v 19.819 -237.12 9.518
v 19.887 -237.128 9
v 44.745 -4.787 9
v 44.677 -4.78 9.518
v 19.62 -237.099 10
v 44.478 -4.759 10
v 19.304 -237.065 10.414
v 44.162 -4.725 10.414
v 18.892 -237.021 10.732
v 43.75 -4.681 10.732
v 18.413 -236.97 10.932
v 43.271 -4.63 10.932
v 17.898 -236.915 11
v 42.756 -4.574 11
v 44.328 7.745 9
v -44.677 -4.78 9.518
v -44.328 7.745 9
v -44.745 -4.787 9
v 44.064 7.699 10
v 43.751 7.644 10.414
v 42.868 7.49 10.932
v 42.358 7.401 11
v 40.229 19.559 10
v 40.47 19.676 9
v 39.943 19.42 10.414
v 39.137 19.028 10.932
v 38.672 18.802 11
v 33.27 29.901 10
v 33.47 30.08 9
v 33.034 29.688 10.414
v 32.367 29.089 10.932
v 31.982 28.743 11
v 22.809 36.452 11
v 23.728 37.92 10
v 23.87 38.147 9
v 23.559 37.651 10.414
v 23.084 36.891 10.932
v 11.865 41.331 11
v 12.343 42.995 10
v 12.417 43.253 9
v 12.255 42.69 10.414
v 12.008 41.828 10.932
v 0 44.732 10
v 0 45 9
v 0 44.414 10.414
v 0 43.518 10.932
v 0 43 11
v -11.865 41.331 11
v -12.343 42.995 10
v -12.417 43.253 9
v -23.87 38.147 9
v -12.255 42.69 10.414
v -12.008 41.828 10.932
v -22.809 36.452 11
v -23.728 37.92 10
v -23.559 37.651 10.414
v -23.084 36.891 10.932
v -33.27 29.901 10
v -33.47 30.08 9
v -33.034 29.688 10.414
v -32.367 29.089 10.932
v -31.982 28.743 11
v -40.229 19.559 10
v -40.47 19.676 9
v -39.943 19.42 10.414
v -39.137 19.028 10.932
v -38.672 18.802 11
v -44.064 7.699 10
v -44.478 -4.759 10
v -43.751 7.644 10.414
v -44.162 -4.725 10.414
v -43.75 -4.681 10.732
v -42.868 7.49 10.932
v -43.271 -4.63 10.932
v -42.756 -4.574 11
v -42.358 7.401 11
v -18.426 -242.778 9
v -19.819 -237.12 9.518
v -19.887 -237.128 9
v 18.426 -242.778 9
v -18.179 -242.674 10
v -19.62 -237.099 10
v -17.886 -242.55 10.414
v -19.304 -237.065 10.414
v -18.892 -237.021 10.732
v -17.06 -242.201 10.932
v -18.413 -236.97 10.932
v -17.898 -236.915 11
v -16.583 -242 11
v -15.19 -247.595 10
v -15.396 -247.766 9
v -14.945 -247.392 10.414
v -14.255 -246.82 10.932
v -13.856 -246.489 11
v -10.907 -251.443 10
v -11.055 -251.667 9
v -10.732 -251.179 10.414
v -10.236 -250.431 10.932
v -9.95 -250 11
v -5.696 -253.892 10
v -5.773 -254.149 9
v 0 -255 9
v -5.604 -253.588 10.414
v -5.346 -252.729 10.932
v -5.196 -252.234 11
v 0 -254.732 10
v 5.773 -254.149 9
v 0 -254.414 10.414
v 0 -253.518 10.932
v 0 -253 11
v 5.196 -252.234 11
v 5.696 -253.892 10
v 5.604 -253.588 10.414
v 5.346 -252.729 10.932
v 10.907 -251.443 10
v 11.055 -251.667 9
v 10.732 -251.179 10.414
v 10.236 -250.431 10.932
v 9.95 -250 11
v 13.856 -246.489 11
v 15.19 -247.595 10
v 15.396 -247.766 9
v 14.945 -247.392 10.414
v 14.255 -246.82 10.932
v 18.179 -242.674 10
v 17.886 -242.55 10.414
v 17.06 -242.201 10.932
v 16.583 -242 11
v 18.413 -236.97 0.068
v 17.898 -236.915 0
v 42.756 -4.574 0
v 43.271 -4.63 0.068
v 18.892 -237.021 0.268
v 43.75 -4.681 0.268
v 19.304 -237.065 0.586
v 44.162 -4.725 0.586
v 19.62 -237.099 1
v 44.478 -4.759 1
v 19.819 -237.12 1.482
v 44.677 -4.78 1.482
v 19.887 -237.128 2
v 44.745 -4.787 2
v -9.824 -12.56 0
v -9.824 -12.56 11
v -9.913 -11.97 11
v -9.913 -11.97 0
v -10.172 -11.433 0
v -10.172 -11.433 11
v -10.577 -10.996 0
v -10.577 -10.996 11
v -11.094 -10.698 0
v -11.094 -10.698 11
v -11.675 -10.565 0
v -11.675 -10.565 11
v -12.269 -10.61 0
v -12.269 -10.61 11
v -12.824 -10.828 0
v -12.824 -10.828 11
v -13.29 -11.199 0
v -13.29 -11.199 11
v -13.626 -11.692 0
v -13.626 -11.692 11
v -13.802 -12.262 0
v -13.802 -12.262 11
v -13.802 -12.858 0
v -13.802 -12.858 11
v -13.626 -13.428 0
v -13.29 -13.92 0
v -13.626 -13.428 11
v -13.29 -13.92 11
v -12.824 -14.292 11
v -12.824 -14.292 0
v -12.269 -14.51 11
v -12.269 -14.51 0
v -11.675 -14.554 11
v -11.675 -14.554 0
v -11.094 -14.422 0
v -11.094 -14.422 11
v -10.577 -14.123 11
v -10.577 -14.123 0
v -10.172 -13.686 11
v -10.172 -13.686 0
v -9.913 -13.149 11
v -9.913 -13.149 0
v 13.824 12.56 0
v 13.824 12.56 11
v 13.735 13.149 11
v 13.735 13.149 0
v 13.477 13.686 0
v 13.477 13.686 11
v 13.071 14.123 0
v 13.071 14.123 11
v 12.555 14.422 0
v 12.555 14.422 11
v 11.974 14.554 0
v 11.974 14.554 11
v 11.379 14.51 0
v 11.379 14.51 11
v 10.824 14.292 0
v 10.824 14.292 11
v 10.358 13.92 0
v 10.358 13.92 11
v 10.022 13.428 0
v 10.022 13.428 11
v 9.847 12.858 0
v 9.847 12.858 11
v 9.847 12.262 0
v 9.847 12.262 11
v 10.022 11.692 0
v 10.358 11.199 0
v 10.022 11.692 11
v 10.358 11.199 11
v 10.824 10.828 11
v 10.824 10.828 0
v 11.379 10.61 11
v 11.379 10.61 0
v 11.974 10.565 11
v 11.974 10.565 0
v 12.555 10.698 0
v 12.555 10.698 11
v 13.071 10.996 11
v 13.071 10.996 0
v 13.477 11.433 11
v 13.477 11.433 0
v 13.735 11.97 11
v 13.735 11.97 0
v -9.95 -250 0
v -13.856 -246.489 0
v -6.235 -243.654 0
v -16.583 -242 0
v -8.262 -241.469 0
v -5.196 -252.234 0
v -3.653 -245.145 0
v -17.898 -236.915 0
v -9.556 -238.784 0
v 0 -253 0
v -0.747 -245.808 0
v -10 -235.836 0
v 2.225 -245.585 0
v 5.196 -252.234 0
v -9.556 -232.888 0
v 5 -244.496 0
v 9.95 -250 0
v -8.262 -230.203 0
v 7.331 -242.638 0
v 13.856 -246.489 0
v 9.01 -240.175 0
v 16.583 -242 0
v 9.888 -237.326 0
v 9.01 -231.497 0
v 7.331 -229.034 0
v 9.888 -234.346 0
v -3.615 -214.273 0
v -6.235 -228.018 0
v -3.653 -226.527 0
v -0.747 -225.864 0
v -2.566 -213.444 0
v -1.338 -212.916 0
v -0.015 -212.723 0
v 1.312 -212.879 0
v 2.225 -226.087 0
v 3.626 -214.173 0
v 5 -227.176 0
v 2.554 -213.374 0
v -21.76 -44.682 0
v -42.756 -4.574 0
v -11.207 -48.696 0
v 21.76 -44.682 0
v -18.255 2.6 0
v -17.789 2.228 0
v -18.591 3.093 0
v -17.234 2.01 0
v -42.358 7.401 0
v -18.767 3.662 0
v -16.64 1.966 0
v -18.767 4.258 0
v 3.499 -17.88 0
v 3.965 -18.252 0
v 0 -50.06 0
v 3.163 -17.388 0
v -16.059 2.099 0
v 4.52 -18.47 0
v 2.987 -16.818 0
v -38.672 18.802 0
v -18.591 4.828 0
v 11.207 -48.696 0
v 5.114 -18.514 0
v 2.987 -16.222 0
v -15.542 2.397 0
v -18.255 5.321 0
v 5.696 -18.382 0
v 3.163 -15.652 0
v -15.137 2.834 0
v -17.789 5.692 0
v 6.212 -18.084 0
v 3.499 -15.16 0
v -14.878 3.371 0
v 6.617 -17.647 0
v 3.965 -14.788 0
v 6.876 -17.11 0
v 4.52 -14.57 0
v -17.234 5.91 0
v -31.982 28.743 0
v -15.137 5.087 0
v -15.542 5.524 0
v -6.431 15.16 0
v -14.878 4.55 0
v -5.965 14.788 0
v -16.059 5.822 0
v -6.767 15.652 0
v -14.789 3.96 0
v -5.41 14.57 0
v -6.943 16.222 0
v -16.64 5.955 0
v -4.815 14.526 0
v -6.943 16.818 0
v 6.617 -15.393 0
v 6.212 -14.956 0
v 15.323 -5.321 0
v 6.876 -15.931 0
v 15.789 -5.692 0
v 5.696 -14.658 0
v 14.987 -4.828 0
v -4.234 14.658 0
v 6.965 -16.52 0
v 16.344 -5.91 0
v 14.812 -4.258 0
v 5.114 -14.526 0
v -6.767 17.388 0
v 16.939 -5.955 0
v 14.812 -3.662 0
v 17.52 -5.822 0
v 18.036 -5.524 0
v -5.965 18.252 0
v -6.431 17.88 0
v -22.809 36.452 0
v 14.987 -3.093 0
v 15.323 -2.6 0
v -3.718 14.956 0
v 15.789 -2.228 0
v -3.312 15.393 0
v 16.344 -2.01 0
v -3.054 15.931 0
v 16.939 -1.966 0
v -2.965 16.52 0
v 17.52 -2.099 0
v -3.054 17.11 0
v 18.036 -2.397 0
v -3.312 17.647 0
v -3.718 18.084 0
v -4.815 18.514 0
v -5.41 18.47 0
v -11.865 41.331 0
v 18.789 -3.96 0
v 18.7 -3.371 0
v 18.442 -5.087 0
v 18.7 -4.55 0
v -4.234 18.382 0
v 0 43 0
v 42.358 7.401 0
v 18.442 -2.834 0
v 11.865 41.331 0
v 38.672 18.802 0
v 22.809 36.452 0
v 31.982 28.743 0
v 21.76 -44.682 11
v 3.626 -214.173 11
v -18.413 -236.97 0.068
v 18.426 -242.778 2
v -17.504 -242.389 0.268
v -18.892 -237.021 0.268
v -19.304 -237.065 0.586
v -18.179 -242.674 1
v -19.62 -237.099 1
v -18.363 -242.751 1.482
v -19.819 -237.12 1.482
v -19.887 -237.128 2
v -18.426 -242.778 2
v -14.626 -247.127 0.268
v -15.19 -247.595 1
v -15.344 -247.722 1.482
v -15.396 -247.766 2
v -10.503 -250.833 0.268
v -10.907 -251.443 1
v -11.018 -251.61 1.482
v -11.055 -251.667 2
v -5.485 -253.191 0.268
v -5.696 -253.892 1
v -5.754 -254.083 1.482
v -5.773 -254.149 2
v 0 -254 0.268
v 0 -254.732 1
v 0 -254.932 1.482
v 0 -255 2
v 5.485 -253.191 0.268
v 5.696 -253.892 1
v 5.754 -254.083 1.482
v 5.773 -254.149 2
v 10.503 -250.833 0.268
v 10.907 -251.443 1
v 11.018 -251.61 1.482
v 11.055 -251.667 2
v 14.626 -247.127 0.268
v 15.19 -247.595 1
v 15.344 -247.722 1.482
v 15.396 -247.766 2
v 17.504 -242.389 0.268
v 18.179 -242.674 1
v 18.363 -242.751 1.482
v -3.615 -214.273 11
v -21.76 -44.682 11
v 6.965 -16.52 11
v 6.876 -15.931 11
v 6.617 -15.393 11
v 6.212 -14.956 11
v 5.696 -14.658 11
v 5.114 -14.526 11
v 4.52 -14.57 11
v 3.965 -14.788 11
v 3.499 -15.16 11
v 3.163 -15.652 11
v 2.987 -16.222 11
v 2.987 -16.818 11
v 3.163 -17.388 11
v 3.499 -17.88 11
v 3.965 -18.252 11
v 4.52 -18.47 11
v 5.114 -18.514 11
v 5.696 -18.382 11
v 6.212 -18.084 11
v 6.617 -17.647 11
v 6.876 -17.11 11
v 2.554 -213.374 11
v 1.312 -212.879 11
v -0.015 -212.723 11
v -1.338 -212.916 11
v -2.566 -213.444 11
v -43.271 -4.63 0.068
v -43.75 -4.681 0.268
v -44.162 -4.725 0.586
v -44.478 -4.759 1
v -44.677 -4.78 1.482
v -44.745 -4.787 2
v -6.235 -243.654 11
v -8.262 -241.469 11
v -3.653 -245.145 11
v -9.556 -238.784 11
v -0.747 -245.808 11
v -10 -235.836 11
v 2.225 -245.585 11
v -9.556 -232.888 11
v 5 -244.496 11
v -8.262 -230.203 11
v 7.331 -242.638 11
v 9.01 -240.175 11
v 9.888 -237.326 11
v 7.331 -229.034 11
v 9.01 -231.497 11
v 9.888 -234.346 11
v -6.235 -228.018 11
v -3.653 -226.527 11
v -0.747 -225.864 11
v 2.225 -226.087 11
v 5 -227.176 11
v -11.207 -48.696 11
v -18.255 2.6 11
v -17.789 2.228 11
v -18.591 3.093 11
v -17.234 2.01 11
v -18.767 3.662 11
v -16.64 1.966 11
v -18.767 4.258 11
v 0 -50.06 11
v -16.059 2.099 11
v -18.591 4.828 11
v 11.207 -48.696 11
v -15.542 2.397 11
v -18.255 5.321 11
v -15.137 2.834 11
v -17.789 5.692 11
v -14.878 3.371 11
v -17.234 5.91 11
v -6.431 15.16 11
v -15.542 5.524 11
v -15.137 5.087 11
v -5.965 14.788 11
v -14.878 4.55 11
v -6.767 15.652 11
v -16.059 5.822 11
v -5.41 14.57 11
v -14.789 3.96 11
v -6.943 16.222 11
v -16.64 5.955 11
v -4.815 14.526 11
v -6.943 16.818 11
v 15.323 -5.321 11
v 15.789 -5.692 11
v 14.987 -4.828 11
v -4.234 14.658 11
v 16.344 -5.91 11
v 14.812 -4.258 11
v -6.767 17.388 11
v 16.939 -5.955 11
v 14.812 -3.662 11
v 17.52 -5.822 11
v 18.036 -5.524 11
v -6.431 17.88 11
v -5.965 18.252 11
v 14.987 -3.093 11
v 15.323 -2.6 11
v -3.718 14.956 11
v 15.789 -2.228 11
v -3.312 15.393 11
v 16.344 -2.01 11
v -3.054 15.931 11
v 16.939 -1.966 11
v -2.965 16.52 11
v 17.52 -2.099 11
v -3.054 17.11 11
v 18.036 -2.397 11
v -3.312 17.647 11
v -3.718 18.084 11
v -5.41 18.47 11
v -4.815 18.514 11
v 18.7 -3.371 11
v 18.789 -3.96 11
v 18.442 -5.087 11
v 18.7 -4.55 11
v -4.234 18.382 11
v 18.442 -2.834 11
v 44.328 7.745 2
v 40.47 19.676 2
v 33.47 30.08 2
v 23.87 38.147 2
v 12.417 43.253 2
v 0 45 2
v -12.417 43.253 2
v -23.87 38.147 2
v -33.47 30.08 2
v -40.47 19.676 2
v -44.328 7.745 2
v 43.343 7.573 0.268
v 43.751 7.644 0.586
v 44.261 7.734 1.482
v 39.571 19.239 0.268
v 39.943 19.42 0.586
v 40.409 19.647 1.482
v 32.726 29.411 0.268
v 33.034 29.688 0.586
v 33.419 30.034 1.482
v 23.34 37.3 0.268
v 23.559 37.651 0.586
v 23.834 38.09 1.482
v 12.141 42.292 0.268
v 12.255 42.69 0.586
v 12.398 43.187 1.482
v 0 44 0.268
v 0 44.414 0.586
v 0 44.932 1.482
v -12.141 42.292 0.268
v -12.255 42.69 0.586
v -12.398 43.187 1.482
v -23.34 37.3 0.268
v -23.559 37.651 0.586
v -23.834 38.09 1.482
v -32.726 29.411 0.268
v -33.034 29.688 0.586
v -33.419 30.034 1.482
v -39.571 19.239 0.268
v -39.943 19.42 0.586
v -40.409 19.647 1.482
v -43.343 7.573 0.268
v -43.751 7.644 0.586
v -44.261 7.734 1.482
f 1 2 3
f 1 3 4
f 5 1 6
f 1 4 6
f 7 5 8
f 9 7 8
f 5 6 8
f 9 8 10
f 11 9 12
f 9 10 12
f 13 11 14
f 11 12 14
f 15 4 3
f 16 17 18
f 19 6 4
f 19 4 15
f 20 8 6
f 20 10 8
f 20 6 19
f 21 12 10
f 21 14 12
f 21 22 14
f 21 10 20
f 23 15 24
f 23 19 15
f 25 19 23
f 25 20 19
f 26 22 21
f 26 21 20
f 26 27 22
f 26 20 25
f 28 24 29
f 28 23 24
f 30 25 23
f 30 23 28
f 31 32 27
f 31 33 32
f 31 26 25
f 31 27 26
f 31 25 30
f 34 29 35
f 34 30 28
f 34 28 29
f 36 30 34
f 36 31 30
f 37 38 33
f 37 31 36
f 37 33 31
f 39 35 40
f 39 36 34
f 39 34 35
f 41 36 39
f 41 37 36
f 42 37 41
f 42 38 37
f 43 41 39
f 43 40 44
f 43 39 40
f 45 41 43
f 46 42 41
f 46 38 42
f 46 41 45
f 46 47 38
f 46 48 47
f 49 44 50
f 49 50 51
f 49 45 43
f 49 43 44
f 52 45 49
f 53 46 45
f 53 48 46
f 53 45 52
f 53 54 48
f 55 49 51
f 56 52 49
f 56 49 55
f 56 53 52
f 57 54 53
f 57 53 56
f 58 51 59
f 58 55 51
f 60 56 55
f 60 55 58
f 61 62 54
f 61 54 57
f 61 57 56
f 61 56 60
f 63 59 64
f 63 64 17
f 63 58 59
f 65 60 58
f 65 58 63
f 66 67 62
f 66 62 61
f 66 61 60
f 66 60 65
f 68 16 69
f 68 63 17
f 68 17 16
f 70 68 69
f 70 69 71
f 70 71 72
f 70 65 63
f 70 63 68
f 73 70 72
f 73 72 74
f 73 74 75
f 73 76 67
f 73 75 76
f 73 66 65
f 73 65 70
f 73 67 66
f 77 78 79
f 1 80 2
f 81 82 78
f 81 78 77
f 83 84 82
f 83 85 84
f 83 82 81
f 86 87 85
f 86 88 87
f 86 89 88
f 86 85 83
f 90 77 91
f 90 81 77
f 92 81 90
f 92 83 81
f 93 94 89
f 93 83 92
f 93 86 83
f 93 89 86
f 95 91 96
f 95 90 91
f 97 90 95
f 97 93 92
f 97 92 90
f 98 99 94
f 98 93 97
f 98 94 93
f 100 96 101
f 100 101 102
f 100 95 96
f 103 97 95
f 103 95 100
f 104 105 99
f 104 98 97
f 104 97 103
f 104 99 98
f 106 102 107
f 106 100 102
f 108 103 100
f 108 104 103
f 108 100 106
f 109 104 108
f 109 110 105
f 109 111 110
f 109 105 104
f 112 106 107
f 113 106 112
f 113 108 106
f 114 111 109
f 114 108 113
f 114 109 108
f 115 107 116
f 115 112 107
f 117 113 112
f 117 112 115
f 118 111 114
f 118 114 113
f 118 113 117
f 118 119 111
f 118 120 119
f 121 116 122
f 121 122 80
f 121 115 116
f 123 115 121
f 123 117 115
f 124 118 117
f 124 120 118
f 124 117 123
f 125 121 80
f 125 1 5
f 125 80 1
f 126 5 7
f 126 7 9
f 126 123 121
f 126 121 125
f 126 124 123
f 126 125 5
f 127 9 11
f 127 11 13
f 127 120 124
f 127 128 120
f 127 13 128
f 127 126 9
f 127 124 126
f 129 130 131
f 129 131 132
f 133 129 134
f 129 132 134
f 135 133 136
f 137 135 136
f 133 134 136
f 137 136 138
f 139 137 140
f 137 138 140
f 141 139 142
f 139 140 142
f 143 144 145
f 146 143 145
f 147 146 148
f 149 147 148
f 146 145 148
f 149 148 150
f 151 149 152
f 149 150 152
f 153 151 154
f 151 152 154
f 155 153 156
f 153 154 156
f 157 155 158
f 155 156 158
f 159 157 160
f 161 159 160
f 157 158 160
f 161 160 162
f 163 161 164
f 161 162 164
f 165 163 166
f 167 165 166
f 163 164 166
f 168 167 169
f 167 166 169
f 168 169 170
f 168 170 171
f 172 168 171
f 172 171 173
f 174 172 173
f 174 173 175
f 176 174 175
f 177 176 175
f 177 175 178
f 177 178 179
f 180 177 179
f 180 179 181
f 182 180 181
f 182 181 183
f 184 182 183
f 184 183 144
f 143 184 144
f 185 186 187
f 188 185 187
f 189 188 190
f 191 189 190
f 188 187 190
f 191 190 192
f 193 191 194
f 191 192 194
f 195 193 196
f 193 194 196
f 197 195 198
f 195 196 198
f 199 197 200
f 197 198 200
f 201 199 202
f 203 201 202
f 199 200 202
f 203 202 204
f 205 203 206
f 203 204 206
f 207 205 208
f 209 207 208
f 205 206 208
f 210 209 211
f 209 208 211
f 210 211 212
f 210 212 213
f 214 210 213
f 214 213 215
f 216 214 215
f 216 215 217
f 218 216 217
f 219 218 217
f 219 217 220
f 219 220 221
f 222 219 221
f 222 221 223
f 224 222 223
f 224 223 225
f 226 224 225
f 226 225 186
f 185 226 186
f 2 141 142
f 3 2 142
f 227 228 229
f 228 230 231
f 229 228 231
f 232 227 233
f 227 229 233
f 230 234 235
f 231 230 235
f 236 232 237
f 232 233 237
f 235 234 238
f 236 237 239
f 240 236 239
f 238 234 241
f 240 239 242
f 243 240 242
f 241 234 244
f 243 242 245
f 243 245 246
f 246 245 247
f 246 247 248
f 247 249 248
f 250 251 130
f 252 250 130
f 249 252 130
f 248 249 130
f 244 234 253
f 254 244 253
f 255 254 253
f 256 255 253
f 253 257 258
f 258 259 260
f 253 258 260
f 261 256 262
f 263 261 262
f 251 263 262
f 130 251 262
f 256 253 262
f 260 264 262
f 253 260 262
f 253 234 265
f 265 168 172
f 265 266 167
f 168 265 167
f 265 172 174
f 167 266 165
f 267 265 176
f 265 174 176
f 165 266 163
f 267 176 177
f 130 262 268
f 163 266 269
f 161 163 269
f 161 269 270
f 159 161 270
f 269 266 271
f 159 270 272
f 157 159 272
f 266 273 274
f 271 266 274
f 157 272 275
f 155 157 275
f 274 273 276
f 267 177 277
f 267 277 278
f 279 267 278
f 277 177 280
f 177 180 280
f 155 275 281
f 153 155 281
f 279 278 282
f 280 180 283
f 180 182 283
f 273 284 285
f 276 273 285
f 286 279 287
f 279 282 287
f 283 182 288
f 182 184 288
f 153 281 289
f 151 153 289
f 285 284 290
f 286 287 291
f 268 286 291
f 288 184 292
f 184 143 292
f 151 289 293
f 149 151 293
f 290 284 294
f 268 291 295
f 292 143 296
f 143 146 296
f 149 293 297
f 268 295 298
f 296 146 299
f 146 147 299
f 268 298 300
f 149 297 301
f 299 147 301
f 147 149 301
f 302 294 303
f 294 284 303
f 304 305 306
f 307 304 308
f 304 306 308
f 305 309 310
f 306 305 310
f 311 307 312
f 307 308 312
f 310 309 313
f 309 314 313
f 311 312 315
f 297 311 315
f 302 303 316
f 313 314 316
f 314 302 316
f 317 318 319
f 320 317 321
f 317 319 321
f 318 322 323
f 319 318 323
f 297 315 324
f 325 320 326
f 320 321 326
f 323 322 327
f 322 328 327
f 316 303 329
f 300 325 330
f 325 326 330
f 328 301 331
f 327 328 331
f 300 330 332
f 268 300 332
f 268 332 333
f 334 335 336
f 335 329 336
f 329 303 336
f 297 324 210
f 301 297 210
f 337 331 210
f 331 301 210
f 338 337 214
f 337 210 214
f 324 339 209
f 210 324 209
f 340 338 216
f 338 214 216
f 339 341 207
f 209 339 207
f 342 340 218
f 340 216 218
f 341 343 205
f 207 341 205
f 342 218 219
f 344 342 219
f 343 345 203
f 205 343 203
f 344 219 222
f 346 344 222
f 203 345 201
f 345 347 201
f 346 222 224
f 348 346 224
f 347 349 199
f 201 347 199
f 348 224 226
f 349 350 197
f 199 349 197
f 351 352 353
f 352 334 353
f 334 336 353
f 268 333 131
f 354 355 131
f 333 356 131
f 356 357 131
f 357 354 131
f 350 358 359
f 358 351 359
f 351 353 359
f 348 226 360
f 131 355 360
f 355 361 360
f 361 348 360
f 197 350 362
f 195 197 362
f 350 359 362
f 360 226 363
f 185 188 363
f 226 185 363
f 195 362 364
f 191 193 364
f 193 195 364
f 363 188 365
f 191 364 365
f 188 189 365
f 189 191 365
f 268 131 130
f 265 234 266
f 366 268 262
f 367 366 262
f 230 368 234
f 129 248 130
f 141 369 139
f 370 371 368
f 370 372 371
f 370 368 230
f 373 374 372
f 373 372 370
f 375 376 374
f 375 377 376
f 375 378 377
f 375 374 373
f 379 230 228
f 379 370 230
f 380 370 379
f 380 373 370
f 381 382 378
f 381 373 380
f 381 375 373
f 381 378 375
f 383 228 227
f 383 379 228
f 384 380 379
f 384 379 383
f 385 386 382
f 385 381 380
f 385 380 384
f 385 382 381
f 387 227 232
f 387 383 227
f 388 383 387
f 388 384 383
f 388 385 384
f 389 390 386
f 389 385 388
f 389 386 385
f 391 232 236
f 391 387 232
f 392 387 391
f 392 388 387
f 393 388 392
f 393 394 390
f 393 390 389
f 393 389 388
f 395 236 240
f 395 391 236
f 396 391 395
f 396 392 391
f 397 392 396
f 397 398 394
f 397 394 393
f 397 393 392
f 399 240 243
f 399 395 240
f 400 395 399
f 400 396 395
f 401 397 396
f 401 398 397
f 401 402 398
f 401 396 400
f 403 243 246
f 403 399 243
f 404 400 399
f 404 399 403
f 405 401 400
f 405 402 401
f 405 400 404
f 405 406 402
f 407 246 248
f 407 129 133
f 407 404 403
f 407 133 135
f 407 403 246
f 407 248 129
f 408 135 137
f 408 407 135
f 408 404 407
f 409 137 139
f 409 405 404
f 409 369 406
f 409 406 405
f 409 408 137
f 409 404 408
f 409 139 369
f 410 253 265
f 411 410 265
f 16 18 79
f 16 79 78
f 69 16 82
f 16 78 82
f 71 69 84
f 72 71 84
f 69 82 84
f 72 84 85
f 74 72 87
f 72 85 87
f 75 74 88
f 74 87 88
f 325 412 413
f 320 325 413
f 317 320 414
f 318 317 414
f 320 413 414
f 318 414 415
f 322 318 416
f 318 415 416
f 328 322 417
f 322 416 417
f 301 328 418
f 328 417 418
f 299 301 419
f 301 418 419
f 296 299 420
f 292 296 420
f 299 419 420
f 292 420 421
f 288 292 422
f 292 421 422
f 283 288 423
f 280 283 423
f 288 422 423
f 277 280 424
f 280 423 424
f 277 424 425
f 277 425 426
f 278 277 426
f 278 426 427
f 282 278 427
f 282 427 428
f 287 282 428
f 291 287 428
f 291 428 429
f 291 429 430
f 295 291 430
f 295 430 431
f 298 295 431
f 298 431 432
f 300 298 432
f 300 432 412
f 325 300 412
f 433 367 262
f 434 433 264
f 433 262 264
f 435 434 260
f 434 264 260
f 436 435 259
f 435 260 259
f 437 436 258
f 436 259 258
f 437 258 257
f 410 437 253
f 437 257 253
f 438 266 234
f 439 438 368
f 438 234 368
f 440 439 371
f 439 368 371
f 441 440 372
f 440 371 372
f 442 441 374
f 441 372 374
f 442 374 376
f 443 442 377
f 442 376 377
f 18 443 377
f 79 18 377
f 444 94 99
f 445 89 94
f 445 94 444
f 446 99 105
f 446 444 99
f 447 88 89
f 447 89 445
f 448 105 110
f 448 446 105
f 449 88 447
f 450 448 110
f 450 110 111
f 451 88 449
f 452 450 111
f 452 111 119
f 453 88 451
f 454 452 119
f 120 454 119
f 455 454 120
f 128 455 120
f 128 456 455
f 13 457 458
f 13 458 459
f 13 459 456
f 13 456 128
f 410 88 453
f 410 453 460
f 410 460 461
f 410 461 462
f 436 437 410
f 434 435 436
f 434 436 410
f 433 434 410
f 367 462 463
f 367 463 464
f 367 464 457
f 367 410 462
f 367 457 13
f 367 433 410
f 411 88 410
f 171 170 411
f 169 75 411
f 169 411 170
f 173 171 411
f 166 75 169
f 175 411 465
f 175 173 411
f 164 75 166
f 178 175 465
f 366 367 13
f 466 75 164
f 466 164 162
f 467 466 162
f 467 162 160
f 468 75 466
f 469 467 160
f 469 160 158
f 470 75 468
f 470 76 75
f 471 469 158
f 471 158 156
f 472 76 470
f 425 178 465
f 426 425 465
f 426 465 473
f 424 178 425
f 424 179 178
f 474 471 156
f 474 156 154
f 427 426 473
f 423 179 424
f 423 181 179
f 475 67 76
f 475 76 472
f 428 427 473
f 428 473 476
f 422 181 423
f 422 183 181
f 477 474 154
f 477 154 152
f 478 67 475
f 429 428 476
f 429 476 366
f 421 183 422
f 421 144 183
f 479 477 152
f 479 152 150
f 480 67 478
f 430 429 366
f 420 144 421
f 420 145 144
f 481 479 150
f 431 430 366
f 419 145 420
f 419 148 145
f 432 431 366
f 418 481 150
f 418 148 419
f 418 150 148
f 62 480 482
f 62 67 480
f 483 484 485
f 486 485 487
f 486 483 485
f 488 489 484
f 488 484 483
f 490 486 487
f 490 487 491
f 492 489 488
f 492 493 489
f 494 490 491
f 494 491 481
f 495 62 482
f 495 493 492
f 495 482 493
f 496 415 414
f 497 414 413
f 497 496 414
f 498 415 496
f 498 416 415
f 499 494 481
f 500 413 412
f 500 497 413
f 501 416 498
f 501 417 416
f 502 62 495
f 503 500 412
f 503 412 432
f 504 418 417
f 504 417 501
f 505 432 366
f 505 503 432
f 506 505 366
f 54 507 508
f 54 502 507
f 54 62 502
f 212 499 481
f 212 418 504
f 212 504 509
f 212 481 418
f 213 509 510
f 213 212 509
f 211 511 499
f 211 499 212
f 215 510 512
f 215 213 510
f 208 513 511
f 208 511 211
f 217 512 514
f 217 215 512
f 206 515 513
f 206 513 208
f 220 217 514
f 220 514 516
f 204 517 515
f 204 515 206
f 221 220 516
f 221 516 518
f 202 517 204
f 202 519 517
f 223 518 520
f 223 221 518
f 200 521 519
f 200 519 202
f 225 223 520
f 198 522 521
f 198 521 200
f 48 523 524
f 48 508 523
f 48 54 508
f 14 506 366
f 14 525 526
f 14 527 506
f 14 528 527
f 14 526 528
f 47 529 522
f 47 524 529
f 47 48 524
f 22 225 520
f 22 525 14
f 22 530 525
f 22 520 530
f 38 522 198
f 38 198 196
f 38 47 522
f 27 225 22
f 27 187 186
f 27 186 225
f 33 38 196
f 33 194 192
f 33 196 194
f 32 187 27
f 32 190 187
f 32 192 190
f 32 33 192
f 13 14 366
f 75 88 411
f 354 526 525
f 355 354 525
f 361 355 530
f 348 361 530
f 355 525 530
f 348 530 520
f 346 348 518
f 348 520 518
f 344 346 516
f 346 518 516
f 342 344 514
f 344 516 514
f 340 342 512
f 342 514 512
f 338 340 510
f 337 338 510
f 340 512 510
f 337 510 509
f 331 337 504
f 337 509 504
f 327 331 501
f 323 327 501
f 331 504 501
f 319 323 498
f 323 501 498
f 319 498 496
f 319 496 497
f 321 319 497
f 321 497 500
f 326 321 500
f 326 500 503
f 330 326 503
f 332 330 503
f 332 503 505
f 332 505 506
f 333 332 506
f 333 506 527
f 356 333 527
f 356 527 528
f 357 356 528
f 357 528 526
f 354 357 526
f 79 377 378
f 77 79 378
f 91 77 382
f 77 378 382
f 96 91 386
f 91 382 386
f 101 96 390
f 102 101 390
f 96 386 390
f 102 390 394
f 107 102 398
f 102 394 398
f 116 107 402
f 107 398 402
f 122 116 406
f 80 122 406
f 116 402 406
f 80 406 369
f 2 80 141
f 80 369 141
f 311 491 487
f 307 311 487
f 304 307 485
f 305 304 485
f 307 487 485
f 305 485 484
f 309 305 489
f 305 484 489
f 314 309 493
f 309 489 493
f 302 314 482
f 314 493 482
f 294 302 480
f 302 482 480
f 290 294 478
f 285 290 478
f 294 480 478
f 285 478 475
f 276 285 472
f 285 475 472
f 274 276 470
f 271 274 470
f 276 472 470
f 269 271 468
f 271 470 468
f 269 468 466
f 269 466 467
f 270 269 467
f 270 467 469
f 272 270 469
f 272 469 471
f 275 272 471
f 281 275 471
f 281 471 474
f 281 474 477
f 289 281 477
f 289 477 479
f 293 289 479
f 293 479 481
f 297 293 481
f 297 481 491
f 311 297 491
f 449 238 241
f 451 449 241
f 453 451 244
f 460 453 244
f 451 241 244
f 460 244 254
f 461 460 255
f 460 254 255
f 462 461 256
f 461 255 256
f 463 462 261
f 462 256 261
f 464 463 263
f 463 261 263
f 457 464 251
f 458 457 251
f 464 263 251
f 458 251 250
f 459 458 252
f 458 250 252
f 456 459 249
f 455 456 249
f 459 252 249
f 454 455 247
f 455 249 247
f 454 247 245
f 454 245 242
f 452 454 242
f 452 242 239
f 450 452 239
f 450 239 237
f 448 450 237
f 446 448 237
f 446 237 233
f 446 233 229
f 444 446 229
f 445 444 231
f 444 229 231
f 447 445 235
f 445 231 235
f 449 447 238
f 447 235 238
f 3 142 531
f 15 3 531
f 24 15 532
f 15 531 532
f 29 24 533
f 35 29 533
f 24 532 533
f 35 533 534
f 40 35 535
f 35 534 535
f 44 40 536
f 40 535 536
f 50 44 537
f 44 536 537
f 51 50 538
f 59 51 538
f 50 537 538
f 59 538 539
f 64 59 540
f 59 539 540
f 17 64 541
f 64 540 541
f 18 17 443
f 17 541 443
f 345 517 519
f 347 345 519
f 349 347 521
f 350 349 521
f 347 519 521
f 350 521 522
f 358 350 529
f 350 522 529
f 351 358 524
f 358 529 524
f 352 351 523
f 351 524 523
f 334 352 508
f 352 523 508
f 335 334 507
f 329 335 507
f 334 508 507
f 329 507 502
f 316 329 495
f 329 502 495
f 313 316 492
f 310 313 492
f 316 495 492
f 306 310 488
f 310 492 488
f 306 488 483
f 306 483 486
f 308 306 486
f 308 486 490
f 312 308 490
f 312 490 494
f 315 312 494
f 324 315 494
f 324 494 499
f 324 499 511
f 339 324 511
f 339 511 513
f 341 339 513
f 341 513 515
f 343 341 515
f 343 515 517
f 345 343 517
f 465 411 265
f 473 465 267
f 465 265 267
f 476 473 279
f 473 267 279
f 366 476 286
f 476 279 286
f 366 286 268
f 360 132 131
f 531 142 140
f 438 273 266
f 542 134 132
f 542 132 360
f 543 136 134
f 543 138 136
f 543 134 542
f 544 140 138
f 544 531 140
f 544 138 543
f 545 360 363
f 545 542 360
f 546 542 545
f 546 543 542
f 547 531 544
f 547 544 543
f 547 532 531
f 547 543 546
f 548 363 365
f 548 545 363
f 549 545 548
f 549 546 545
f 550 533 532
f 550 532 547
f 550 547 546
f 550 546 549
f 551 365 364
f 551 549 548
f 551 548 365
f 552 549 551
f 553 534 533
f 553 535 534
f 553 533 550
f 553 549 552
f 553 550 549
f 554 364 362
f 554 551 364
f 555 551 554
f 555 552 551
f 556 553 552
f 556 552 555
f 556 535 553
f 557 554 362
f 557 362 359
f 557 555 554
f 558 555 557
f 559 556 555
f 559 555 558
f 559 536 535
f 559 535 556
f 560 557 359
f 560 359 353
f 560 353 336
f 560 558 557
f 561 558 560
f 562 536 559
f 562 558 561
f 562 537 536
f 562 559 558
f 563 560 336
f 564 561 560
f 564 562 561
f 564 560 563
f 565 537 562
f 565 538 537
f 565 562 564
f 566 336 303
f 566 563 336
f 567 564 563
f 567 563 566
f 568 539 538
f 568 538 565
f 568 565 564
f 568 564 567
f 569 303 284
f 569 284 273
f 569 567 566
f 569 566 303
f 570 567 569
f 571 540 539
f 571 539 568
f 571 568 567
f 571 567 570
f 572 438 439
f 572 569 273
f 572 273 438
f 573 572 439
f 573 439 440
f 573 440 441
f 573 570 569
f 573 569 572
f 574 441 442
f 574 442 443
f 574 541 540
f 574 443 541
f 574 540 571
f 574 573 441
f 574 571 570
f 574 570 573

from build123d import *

# Parameters (mm, degrees)
EXTRUDE_1_DEPTH     = 11
SKETCH_2_R          = 10
CUT_EXTRUDE_1_DEPTH = 11
FILLET_1_R          = 2
CUT_EXTRUDE_2_DEPTH = 20
SKETCH_6_R          = 2
CUT_EXTRUDE_4_DEPTH = 33


with BuildPart() as part:
    # 草图1 → 凸台-拉伸1 (new body)
    with BuildSketch(Plane.XY):
        with BuildLine():
            Line((-44.744635323, -4.787234043), (-19.886504588, -237.127659574))
            ThreePointArc((-19.886504588, -237.127659574), (0, -255), (19.886504588, -237.127659574))
            Line((19.886504588, -237.127659574), (44.744635323, -4.787234043))
            ThreePointArc((44.744635323, -4.787234043), (0, 45), (-44.744635323, -4.787234043))
        make_face()
    extrude(amount=EXTRUDE_1_DEPTH)

    # 草图2 → 切除-拉伸1 (cut)
    with BuildSketch(Plane(origin=(0, 0, 0), x_dir=(-1, 0, 0), z_dir=(0, 0, -1))):
        with Locations((0, -235.836034695)):
            Circle(SKETCH_2_R)
    extrude(amount=-CUT_EXTRUDE_1_DEPTH, mode=Mode.SUBTRACT)

    # 圆角1
    fillet_1_edges = [part.edges().sort_by_distance(p)[0] for p in [
        (0, -255, 11),
        (32.315569956, -120.957446809, 11),
        (0, 45, 11),
        (32.315569956, -120.957446809, 0),
        (0, -255, 0),
        (-32.315569956, -120.957446809, 0),
        (0, 45, 0),
        (-32.315569956, -120.957446809, 11),
    ]]
    fillet(fillet_1_edges, radius=FILLET_1_R)

    # 草图4 → 切除-拉伸2 (cut)
    with BuildSketch(Plane(origin=(0, 0, 0), x_dir=(-1, 0, 0), z_dir=(0, 0, -1))):
        with BuildLine():
            Line((-21.759824224, -44.682312886), (-3.625991278, -214.173032358))
            ThreePointArc((-3.625991278, -214.173032358), (0.015295132, -212.723088949), (3.615338262, -214.272602446))
            Line((3.615338262, -214.272602446), (21.759824224, -44.682312886))
            ThreePointArc((21.759824224, -44.682312886), (0, -50.060383894), (-21.759824224, -44.682312886))
        make_face()
    extrude(amount=-CUT_EXTRUDE_2_DEPTH, mode=Mode.SUBTRACT)

    # 草图6 → 切除-拉伸4 (cut)
    with BuildSketch(Plane.XY.offset(11)):
        with Locations((-16.789244382, 3.960274368)):
            Circle(SKETCH_6_R)
        with Locations((-4.964923982, 16.52004933)):
            Circle(SKETCH_6_R)
        with Locations((11.8243204, 12.559774961)):
            Circle(SKETCH_6_R)
        with Locations((16.789244382, -3.960274368)):
            Circle(SKETCH_6_R)
        with Locations((4.964923982, -16.52004933)):
            Circle(SKETCH_6_R)
        with Locations((-11.8243204, -12.559774961)):
            Circle(SKETCH_6_R)
    extrude(amount=-CUT_EXTRUDE_4_DEPTH, mode=Mode.SUBTRACT)


solid = part.part
